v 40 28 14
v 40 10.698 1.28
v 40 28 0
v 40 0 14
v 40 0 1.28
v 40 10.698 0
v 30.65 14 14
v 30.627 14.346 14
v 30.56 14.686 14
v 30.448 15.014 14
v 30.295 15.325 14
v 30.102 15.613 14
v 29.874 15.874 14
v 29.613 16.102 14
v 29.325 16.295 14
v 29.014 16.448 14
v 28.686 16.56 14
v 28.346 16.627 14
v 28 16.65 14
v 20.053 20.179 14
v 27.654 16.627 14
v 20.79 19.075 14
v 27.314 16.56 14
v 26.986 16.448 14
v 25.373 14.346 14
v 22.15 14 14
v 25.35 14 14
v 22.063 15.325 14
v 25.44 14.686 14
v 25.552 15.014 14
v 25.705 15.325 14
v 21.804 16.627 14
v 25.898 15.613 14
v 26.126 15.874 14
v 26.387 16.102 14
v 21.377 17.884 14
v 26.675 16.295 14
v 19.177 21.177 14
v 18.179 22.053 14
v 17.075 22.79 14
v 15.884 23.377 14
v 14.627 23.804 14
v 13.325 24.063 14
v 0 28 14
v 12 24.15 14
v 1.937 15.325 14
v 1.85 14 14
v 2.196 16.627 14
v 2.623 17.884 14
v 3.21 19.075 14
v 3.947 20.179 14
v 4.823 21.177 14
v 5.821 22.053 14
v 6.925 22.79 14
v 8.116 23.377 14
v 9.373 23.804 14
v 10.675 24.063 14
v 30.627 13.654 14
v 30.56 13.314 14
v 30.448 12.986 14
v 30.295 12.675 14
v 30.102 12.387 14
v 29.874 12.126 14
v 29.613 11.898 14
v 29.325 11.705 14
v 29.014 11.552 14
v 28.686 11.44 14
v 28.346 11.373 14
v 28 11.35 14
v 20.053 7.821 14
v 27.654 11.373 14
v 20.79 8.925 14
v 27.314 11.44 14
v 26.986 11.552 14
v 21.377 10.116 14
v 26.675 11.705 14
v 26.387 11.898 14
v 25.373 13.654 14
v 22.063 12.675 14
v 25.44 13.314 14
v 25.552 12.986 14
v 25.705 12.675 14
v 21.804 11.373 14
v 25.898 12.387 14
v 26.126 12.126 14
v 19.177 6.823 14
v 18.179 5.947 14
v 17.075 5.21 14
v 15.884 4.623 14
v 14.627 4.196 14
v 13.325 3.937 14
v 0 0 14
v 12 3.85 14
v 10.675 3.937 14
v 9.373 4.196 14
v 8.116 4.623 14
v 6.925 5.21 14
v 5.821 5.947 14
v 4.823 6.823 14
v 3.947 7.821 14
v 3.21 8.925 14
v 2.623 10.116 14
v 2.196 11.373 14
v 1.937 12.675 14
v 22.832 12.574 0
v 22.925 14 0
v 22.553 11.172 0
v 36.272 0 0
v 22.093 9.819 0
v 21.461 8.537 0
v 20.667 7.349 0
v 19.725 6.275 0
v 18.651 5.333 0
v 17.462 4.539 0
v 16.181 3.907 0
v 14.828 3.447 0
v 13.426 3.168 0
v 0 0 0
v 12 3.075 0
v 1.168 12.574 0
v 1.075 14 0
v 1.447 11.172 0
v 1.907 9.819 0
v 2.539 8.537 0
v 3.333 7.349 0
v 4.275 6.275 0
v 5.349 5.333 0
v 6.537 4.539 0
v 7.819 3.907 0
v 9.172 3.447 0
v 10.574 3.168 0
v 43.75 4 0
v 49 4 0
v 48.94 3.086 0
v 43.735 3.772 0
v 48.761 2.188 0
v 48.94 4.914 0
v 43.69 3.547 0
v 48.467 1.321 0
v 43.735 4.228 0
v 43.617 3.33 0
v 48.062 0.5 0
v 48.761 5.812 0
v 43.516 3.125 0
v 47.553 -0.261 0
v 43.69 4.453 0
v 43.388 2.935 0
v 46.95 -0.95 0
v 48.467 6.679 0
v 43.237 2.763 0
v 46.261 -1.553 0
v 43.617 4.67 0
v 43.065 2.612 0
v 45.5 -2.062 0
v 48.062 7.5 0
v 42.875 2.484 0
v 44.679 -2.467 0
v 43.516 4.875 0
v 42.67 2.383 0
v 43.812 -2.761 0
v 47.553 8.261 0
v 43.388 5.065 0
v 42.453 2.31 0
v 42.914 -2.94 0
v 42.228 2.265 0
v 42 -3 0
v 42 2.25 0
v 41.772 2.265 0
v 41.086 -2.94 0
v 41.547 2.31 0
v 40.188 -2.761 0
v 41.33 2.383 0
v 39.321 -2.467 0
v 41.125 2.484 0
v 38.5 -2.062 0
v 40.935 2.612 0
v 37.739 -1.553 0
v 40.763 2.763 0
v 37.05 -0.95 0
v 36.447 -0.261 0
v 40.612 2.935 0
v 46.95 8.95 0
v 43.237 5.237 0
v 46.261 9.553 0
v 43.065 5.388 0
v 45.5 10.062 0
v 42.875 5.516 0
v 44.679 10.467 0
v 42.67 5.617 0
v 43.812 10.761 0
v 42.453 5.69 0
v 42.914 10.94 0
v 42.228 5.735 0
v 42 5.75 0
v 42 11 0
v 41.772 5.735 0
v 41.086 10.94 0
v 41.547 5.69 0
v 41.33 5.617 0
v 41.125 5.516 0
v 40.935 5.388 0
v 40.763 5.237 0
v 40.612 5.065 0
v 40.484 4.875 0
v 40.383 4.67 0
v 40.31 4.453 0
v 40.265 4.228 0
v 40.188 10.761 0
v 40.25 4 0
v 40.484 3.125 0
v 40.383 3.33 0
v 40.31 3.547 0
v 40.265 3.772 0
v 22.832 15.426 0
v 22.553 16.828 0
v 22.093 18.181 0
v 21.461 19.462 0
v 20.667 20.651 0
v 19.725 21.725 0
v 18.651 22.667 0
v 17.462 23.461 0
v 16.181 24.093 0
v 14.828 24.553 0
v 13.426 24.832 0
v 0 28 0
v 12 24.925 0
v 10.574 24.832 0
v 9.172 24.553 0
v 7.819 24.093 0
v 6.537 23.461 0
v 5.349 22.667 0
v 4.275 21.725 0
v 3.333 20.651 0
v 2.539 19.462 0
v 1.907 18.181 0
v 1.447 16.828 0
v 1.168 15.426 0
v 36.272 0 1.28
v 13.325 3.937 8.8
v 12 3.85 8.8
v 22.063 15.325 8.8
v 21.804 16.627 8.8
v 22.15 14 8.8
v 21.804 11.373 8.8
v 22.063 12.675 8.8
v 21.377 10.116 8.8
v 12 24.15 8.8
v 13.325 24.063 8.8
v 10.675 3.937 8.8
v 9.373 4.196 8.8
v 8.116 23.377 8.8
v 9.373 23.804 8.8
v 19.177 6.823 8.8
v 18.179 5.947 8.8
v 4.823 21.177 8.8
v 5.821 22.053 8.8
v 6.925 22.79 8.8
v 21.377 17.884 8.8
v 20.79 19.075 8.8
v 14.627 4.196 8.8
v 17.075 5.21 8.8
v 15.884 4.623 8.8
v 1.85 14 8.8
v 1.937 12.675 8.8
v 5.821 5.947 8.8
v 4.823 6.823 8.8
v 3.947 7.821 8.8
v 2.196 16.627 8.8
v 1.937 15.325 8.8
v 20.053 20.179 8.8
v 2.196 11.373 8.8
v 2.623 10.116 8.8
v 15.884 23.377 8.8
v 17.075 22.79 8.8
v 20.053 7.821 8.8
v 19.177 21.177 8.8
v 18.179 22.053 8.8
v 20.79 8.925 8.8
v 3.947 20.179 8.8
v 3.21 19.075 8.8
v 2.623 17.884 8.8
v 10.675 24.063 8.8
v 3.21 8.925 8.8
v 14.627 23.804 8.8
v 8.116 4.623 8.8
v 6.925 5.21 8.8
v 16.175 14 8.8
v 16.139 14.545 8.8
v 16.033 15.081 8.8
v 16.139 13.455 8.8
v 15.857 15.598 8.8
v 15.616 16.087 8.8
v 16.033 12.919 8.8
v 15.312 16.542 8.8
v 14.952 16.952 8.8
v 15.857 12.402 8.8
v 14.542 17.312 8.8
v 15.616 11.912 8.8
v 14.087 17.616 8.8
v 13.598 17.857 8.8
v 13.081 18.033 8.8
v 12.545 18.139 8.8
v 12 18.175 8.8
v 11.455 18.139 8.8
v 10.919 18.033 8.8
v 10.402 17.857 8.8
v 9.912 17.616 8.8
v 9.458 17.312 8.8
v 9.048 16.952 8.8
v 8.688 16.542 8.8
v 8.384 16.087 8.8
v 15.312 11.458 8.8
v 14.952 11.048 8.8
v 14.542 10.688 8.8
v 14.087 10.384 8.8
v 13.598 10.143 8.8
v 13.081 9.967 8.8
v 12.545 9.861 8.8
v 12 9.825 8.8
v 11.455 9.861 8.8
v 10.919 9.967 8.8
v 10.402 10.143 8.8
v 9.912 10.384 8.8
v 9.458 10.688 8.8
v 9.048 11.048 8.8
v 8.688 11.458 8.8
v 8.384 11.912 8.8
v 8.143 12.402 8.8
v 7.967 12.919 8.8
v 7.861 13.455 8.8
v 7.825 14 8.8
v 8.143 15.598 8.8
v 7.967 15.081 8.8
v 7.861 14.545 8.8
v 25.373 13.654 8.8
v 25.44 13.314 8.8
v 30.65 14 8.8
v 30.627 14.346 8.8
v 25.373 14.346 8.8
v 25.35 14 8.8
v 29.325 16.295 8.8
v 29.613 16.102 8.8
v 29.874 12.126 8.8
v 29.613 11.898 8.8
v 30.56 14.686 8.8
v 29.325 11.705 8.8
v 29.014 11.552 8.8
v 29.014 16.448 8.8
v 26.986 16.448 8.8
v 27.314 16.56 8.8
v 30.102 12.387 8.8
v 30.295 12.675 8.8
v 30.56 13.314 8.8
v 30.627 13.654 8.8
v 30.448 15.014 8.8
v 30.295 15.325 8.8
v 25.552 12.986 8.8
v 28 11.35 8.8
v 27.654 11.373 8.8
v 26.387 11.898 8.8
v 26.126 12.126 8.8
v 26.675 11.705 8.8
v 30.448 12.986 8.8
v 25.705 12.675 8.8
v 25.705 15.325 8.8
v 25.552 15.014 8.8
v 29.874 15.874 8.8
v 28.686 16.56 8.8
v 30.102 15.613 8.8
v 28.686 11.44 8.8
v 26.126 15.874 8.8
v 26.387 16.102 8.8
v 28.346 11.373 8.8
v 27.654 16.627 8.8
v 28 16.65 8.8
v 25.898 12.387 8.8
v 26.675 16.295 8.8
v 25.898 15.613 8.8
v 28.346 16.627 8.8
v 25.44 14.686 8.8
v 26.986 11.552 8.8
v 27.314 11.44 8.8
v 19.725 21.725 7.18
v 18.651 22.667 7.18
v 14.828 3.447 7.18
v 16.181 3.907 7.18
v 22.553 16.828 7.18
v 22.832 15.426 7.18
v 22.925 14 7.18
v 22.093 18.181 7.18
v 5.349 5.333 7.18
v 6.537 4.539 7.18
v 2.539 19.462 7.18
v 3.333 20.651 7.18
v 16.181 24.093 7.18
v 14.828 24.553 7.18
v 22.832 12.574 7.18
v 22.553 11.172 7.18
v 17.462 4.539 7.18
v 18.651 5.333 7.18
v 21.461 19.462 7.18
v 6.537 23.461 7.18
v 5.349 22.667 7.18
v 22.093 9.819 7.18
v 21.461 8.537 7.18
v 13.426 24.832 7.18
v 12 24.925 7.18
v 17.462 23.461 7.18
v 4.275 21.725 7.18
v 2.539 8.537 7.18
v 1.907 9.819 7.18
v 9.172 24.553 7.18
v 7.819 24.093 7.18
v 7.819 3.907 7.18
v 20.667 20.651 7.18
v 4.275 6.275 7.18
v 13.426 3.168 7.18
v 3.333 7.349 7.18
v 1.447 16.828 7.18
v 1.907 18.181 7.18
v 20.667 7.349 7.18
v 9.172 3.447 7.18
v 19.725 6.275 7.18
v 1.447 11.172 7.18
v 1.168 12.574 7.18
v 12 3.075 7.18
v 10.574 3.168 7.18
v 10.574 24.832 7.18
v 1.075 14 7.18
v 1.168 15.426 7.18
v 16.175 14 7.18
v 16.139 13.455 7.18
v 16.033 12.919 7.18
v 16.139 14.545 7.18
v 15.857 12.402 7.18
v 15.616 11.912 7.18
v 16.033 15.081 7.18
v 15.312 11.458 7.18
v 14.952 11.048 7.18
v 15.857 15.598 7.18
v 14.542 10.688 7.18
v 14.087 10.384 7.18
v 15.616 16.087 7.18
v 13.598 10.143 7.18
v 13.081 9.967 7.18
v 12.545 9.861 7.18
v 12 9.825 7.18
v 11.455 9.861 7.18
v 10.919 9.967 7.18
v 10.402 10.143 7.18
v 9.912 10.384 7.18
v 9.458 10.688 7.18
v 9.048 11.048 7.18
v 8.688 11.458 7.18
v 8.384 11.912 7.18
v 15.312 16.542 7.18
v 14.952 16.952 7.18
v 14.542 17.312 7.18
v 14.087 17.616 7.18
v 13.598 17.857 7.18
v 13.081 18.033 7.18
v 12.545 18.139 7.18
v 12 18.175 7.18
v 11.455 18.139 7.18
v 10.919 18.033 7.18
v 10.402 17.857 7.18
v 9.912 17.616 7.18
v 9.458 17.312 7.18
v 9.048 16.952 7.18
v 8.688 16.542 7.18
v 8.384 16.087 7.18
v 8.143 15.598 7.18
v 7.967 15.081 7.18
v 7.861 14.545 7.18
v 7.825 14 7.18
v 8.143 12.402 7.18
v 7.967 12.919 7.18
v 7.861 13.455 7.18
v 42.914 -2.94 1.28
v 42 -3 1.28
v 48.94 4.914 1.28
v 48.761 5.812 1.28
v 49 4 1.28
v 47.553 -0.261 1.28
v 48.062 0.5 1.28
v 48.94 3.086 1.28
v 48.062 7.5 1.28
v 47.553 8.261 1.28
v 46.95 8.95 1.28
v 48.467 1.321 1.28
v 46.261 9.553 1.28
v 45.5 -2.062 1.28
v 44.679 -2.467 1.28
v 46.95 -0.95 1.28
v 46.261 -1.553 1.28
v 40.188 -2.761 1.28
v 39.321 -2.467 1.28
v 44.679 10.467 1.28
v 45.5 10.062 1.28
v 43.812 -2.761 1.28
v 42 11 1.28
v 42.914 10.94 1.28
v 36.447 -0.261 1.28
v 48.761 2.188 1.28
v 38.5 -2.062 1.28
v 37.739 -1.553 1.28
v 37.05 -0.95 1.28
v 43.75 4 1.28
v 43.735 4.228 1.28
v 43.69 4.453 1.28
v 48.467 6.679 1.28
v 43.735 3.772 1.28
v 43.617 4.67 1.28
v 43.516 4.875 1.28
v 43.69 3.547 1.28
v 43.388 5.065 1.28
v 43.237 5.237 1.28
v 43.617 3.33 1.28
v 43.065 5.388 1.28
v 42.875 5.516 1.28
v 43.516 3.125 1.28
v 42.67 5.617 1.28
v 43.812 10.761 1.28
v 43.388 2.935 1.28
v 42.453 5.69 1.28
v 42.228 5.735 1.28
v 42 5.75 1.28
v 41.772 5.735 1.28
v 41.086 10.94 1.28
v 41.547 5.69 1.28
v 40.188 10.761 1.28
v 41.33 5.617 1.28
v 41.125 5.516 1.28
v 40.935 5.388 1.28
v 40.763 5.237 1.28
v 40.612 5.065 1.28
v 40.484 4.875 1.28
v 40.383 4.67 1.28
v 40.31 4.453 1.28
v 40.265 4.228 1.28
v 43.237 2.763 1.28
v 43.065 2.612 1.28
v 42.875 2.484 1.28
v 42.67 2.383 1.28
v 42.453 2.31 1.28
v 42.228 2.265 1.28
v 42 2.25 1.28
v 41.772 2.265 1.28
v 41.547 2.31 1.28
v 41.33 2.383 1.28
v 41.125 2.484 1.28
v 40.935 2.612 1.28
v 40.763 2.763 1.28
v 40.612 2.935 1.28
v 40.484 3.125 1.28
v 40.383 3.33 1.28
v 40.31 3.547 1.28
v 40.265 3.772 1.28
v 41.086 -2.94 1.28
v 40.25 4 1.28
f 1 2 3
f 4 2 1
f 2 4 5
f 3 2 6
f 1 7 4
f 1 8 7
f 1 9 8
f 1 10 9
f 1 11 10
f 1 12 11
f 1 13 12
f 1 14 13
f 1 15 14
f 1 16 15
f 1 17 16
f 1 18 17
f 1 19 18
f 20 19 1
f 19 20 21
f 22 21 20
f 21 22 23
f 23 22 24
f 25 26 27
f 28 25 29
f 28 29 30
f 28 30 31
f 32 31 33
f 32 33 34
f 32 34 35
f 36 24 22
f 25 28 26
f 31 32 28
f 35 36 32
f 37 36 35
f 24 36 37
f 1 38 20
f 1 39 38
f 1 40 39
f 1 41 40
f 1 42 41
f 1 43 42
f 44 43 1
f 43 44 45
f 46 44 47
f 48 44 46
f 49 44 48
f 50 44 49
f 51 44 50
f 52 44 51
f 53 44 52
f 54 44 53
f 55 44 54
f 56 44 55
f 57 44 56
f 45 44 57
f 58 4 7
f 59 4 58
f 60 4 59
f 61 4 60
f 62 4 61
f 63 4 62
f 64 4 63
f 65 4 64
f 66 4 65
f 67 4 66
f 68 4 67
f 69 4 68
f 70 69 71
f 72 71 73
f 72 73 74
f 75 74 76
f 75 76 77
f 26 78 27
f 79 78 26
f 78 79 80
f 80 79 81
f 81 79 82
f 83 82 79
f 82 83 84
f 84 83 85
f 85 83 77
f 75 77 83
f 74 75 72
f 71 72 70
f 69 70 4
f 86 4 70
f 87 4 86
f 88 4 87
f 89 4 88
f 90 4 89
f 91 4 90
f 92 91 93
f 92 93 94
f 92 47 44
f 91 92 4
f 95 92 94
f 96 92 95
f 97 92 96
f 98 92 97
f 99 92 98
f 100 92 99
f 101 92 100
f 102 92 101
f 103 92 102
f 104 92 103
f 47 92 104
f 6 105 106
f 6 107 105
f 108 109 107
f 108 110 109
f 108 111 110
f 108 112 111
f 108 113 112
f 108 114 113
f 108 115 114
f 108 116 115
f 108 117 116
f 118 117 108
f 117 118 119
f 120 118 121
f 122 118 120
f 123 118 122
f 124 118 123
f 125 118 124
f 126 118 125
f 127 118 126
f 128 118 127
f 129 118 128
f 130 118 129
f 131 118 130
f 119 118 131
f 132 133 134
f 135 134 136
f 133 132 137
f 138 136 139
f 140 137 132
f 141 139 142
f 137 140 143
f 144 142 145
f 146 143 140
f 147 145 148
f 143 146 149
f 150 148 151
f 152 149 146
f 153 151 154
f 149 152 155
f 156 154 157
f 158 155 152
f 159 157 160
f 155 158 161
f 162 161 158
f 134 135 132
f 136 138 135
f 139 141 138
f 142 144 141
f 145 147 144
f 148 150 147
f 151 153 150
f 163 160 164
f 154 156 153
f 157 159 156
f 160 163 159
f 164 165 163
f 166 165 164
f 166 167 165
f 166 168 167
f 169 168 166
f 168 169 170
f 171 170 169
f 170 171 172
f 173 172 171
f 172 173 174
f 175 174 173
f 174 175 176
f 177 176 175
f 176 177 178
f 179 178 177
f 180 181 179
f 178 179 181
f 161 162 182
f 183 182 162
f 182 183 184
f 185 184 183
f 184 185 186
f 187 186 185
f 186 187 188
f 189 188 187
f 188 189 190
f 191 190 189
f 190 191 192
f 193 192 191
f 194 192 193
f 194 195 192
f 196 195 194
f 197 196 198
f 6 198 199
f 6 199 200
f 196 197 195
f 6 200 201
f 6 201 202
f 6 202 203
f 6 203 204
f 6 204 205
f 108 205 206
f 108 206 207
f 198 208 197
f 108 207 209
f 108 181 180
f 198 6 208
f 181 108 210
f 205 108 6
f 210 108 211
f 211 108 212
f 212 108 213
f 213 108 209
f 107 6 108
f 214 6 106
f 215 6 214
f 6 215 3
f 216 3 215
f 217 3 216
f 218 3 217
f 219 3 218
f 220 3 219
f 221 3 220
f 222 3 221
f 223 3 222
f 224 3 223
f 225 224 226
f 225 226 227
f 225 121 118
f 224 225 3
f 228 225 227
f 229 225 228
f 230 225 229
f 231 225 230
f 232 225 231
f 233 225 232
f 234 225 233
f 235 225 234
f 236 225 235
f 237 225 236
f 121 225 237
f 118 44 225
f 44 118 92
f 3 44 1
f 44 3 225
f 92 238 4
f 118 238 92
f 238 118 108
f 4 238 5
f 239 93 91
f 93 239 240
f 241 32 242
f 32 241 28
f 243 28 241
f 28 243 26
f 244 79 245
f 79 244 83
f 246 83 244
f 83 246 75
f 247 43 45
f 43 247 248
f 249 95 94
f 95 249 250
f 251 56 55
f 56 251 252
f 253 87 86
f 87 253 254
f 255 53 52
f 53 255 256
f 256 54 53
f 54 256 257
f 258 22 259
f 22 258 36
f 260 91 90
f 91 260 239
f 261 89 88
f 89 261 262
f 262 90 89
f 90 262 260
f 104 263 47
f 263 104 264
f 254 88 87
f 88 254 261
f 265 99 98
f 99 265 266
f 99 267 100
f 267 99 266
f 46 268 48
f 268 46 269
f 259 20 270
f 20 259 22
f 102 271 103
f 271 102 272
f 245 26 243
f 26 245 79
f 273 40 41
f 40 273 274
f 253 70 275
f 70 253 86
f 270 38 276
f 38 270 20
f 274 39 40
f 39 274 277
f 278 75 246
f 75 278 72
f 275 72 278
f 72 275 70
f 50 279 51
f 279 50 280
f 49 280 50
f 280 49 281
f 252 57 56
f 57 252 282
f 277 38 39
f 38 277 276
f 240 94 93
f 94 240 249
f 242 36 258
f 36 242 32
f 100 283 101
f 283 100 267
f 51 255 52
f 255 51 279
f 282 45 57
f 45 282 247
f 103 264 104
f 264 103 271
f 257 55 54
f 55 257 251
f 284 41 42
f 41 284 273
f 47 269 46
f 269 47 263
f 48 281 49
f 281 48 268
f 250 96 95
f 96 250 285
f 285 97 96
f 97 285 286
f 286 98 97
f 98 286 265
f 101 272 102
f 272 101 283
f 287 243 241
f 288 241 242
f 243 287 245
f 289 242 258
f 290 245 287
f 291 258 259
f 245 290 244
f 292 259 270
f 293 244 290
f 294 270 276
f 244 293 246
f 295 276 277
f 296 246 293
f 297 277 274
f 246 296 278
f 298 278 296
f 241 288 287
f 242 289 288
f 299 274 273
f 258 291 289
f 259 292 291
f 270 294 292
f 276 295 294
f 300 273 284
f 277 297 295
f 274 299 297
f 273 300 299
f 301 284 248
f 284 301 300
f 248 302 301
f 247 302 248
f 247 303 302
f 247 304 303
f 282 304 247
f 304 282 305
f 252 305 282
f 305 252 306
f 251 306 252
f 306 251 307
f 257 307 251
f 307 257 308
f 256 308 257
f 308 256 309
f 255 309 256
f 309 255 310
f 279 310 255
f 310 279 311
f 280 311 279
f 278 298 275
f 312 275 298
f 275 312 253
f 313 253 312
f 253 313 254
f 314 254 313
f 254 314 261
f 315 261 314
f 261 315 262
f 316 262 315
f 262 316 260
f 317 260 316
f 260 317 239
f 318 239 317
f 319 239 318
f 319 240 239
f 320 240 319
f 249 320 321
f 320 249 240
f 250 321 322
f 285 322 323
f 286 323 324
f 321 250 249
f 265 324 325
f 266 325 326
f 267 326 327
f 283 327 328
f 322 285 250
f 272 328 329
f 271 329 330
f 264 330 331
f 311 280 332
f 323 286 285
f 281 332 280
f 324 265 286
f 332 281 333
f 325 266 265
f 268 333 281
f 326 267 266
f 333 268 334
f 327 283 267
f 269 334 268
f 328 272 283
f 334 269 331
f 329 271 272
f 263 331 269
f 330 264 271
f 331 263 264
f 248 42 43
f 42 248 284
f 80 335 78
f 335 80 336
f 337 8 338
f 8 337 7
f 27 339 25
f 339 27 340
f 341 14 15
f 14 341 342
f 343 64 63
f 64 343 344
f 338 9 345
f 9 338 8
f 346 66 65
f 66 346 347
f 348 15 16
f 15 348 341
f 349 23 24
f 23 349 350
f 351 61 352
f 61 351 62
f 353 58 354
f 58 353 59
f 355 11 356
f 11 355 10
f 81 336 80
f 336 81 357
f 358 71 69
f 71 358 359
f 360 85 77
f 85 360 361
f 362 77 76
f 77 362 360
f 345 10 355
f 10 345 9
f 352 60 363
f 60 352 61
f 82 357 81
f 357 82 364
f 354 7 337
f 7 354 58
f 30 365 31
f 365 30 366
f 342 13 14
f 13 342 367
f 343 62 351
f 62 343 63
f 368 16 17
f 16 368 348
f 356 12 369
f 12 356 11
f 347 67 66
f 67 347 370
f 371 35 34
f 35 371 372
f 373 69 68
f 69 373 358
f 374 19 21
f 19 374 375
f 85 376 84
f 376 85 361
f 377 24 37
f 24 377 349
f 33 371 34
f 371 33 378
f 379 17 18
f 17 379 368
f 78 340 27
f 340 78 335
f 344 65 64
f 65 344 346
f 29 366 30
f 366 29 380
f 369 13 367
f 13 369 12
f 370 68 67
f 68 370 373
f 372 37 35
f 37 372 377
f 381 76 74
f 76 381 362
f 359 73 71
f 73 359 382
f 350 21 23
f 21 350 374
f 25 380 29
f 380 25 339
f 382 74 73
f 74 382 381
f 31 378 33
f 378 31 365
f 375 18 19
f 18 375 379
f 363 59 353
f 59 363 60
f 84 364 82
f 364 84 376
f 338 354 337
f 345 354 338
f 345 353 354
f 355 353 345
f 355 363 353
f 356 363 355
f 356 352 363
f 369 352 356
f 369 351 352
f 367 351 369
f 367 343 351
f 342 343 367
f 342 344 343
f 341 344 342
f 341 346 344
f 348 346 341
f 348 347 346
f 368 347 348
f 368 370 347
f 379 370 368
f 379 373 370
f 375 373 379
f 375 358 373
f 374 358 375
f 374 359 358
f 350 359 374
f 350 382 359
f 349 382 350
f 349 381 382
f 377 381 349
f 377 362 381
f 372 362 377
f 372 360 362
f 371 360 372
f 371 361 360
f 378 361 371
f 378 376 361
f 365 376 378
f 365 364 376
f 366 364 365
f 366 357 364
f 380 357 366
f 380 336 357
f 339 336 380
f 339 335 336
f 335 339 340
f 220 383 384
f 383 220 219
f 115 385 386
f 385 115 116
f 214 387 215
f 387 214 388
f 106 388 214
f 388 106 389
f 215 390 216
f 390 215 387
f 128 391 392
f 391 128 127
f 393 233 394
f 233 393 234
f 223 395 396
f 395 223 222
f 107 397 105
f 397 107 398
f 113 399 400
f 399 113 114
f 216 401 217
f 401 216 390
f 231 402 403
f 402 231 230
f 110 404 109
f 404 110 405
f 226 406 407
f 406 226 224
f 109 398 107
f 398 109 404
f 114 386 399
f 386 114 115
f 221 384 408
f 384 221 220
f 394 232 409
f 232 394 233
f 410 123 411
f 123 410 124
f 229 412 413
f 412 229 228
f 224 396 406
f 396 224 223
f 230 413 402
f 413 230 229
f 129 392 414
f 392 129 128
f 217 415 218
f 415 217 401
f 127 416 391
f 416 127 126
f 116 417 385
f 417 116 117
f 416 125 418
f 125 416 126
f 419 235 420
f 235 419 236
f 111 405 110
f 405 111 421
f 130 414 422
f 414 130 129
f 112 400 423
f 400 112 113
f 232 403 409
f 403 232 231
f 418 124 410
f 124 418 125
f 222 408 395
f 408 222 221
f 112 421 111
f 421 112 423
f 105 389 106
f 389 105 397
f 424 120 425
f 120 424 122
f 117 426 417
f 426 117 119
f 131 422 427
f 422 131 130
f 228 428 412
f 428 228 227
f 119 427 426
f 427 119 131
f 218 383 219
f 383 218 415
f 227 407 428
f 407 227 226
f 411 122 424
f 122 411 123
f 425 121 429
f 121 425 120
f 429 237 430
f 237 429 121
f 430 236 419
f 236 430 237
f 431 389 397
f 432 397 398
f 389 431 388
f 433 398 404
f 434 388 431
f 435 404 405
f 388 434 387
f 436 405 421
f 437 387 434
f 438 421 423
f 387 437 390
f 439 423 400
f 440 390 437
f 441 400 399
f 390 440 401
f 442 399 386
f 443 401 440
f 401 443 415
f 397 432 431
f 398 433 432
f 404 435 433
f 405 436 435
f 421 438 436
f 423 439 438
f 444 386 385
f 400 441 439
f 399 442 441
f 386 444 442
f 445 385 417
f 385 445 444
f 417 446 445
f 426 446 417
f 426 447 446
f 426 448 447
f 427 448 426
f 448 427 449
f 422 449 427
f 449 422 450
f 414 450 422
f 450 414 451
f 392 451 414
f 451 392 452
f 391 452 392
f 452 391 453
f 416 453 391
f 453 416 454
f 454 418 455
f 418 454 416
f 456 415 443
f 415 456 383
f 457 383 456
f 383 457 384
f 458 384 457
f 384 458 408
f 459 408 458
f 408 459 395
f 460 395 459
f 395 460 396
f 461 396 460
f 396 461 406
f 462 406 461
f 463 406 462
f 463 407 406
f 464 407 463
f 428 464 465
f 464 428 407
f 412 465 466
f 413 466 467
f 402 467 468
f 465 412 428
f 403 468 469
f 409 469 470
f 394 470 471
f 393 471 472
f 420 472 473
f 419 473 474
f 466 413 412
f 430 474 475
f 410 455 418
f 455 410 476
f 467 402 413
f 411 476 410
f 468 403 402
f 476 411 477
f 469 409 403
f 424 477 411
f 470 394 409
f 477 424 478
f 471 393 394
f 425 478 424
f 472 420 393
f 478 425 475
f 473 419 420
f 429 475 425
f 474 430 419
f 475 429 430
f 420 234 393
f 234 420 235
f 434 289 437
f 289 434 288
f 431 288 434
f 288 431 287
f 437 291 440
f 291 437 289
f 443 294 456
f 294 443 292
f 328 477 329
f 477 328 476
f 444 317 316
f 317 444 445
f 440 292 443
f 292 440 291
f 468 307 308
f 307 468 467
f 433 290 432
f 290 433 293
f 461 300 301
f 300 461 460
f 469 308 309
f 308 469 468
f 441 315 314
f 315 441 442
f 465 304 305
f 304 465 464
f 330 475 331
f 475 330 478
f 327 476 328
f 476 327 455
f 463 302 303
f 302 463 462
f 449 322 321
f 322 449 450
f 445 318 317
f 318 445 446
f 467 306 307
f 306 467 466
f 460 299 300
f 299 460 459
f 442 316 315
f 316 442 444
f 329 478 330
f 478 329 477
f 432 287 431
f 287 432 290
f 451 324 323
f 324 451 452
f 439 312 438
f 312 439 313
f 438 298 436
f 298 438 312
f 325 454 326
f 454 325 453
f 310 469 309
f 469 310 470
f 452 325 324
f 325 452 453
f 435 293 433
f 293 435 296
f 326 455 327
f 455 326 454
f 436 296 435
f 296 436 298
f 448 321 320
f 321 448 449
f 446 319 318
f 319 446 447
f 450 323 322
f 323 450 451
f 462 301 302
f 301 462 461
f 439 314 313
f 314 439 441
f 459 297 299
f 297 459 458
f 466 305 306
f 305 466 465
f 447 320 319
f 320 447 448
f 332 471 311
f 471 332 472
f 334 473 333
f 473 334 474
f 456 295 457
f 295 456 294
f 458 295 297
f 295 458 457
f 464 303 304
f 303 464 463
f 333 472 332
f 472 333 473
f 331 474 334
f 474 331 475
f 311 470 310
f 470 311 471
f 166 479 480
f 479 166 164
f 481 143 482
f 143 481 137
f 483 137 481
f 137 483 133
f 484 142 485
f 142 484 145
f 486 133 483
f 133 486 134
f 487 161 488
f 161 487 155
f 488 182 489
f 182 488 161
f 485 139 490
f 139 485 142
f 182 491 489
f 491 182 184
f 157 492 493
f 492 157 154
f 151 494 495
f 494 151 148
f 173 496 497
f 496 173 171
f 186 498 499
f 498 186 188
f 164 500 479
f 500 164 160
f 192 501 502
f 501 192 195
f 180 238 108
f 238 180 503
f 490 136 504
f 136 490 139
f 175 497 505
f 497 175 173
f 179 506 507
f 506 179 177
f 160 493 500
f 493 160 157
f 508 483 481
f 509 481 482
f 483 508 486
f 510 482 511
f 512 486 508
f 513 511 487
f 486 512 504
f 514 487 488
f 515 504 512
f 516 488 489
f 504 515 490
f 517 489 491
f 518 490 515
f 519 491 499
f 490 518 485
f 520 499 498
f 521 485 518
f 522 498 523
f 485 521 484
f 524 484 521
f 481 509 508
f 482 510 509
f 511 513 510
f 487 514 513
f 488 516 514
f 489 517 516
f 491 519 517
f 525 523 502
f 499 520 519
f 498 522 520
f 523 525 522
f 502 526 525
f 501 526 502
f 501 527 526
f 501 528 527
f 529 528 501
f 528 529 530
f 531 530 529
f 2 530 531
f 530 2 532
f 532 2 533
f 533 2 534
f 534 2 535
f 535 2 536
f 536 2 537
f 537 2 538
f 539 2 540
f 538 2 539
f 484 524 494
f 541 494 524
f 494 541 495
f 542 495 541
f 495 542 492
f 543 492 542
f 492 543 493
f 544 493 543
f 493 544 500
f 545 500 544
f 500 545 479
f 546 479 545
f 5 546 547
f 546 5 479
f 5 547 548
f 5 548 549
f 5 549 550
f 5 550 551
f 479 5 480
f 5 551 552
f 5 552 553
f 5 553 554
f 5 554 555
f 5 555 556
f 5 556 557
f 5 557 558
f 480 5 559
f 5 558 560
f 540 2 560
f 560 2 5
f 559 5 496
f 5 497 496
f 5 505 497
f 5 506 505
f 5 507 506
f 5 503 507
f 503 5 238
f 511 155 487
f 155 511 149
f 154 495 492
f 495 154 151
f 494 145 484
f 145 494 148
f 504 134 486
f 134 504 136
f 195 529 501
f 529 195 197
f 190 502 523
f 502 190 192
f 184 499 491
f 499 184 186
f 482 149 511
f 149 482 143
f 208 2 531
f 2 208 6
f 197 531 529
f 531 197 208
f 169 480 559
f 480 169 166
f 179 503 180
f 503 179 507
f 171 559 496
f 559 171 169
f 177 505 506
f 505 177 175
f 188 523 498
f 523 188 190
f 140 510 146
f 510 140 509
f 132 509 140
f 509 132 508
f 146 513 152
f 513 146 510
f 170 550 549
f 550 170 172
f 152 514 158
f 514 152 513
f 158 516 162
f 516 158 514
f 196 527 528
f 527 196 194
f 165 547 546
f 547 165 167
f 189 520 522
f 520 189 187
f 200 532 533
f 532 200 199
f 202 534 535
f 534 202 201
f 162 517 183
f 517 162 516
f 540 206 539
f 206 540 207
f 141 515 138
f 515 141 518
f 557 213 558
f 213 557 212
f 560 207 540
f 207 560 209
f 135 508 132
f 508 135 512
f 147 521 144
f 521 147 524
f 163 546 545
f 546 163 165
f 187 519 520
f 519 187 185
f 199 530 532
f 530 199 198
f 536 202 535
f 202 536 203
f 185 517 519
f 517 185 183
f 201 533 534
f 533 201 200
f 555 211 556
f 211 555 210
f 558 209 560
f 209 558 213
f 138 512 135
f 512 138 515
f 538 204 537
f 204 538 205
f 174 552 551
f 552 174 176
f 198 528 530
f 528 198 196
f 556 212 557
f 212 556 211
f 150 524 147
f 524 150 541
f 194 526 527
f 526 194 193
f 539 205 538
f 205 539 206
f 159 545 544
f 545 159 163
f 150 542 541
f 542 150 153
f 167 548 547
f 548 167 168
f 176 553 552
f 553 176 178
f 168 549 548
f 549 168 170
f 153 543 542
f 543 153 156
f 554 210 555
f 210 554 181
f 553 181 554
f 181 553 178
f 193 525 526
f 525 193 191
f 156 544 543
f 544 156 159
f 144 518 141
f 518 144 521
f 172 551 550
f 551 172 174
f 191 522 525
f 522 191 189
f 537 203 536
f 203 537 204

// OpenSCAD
// file: parameters.scad
// =============================================================================
// Gen-Z Dual-stator mid-rotor Halbach sandwich — WOUND-AWARE (HARD GATE)
// ONE mid rotor (magnets both faces) | TWO wound pancake stators | outer endbells
// =============================================================================

wire_awg            = 26;
wire_od             = 0.45;
turns               = 115;      // 9 coils/stator ×2 = 18 ×115 ×~0.11 ≈ 228 m
fill                = 0.70;
layers_per_face     = 2;
wind_build_axial    = layers_per_face * wire_od * fill;   // 0.63
wind_build_radial   = 2.8 * wire_od * fill;               // 0.882

coil_id_r           = 22.0;
coil_od_r           = 58.0;
span_deg            = 34.0;     // 9 stations × 40°
former_web          = 1.9;
flange_t            = 0.70;
wall                = 1.2;
slot_w              = 2.4;
mount_hole          = 3.5;
tab_len             = 7.0;

former_bare_h       = former_web + 2 * flange_t;            // 3.3
coil_envelope_h     = former_bare_h + 2 * wind_build_axial; // 4.56

run_clear           = 0.65;
gap_spacer_h        = run_clear + wind_build_axial;         // 1.28
m2m                 = coil_envelope_h + 2 * run_clear;      // 5.86 per gap

coil_stations       = 9;        // per stator; ×2 = 18 total
bay_r_in            = coil_id_r - 2.0 - wind_build_radial;
bay_r_out           = coil_od_r + 2.0 + wind_build_radial;
bay_span            = span_deg + 4.0;
bay_offset          = 2.0;
bay_depth           = former_bare_h + wind_build_axial;
stator_back_web     = 2.0;
stator_thick        = bay_depth + stator_back_web;
stator_od           = 156.0;
shaft_clear_stator  = 40.0;
coil_mount_r        = 30.0;

large_pocket_d      = 20.3;
small_pocket_d      = 5.3;
pocket_h            = 5.2;
large_n             = 8;
R_large             = 52.0;
R_small_inner       = 40.0;
R_small_mid         = 52.0;
R_small_outer       = 64.0;
carrier_od          = 152.0;
mid_carrier_thick   = 12.0;
hub_h               = 10.0;
hub_od              = 30.0;
rotor_b_offset_deg  = 22.5;

shaft_bore          = 8.35;
bearing_d           = 21.85;
bearing_h           = 7.2;
m3_clear            = 3.5;
bolt_r_inner        = 36.0;
bolt_n_inner        = 6;
flange_bolt_r       = 72.0;
flange_bolt_n       = 6;
brace_r             = 68.0;
brace_d             = 4.3;
brace_n             = 4;

spacer_pad_od       = 14.0;
spacer_pad_id       = m3_clear;
endbell_od          = 156.0;
endbell_thick       = 8.0;
endbell_shaft_clear = 10.0;

$fn = 64;
// main file
// Gen-Z fit coupon — magnet pockets + 608 + spacer height
include <parameters.scad>;
$fn = 48;
block_w = 40; block_d = 28; block_h = 14;
difference() {
    cube([block_w, block_d, block_h]);
    translate([12, block_d/2, block_h - pocket_h])
        cylinder(d=large_pocket_d, h=pocket_h + 0.2);
    translate([28, block_d/2, block_h - pocket_h])
        cylinder(d=small_pocket_d, h=pocket_h + 0.2);
    translate([12, block_d/2, -0.02])
        cylinder(d=bearing_d, h=bearing_h);
    translate([12, block_d/2, -0.1])
        cylinder(d=shaft_bore, h=block_h + 1);
}
translate([block_w + 2, 4, 0])
    difference() {
        cylinder(d=spacer_pad_od, h=gap_spacer_h);
        translate([0, 0, -0.1]) cylinder(d=spacer_pad_id, h=gap_spacer_h + 0.2);
    }
